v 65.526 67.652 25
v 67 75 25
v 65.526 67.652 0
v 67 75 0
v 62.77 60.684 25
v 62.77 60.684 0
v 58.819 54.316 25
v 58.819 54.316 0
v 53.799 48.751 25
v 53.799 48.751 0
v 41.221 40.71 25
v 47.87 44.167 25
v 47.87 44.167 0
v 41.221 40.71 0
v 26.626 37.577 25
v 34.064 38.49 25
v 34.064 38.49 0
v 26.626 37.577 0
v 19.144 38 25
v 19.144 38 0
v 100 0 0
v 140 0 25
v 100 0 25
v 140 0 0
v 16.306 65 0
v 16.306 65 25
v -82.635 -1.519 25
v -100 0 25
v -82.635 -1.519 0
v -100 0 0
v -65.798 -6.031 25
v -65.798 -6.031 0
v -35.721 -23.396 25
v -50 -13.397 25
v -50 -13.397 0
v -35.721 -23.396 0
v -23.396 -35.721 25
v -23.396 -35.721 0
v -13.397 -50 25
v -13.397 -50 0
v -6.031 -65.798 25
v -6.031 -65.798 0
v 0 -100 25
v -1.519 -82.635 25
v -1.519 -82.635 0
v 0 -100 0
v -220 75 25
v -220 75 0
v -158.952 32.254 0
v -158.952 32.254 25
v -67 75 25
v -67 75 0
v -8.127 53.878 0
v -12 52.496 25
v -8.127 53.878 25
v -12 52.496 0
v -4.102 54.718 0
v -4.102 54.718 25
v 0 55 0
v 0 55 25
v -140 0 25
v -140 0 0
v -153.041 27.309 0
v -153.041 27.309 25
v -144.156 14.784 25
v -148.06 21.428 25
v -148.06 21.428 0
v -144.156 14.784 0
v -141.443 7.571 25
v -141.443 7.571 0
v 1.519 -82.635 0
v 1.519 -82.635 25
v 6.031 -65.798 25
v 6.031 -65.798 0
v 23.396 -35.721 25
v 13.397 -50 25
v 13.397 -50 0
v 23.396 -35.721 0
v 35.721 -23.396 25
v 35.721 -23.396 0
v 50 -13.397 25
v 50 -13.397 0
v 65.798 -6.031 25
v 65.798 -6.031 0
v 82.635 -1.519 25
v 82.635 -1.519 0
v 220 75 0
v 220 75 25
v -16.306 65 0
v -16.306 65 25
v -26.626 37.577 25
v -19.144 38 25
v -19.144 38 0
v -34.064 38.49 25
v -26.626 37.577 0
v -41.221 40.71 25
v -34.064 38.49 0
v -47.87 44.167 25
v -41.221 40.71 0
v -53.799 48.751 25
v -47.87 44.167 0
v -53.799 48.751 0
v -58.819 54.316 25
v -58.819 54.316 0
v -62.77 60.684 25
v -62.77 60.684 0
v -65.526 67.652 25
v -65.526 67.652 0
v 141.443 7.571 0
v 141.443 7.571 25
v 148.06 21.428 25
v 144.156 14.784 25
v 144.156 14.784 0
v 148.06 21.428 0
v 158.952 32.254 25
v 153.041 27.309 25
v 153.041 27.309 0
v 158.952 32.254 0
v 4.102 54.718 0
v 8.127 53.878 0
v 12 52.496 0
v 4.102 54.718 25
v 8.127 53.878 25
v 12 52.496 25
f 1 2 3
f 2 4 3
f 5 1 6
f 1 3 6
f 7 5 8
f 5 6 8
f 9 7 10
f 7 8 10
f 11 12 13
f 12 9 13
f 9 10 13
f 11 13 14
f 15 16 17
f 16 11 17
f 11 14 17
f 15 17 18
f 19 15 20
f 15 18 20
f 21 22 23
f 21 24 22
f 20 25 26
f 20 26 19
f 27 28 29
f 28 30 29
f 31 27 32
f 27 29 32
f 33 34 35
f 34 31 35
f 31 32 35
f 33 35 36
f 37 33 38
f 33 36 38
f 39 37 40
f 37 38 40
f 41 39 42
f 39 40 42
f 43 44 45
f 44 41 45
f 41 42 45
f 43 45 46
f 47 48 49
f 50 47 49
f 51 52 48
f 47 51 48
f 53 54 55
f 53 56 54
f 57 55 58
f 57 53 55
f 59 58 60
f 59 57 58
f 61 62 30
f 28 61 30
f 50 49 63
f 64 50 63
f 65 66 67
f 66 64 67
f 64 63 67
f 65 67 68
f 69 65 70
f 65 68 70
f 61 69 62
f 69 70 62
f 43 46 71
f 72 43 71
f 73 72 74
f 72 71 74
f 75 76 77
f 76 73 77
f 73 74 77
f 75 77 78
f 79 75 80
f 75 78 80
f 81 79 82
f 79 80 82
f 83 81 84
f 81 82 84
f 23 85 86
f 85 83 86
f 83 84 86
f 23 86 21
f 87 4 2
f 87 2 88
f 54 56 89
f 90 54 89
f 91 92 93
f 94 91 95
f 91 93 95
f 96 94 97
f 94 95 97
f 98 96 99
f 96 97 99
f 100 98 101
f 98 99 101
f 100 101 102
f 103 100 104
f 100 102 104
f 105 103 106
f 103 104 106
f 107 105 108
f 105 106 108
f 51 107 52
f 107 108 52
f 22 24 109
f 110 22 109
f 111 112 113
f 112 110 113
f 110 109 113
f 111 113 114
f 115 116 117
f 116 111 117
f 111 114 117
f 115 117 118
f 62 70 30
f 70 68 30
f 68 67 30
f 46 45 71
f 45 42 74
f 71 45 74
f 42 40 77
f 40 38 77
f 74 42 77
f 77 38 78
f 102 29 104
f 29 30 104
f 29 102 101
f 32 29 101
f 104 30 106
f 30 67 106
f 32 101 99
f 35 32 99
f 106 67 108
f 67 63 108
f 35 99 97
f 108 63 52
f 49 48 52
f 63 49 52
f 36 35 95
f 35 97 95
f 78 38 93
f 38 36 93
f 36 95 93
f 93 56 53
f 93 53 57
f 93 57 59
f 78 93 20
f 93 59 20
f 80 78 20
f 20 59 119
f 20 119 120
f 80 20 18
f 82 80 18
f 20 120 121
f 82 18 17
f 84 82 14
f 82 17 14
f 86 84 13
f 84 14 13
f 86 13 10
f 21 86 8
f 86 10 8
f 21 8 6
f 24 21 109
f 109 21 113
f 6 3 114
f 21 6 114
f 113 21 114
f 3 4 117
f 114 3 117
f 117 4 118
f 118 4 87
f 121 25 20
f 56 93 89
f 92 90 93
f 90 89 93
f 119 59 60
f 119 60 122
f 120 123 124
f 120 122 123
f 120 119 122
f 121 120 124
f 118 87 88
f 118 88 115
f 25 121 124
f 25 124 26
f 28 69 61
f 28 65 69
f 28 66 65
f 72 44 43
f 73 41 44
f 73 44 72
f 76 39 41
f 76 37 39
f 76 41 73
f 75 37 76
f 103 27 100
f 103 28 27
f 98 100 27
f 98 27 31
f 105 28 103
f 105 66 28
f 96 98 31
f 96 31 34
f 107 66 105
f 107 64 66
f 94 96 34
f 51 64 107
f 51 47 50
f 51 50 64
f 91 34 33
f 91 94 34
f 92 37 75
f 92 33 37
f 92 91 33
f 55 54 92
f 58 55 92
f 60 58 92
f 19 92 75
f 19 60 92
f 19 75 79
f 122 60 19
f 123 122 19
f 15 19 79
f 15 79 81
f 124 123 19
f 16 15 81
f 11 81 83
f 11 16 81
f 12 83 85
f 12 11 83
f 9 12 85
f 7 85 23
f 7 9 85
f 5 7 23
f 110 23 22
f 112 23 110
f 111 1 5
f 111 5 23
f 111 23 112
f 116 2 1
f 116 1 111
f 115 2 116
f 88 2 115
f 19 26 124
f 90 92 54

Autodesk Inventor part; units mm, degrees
ref_plane "YZ Plane" through (0, 0, 0) normal (1, 0, 0) x (0, 1, 0)
ref_plane "XZ Plane" through (0, 0, 0) normal (0, 1, 0) x (-1, 0, 0)
ref_plane "XY Plane" through (0, 0, 0) normal (0, 0, 1) x (1, 0, 0)
sketch "Sketch1" plane through (0, 0, 0) normal (0, 0, 1) x (1, 0, 0)
  line L0 (0, 110.8966) -> (0, -110.8966) construction
  line L1 (-205.6207, 0) -> (205.6207, 0) construction
  line L2 (-67, 75) -> (-220, 75)
  line L3 (-220, 75) -> (-158.9525, 32.2541)
  line L4 (-140, 0) -> (-100, 0)
  arc A0 (-140, 0) -> (-158.9525, 32.2541) centre (-184.7635, -4.6077) ccw
  arc A1 (0, -100) -> (-100, 0) centre (-100, -100) ccw
  arc A2 (0, 55) -> (-12, 52.4955) centre (0, 25) ccw
  line L5 (-12, 52.4955) -> (-16.3057, 65)
  line L6 (-16.3057, 65) -> (-19.1435, 38)
  arc A3 (-67, 75) -> (-19.1435, 38) centre (-25.2476, 79.5541) ccw
  line L7 (205.6207, 0) -> (-205.6207, 0) construction
  line L8 (67, 75) -> (220, 75)
  line L9 (220, 75) -> (158.9525, 32.2541)
  line L10 (140, 0) -> (100, 0)
  arc A4 (158.9525, 32.2541) -> (140, 0) centre (184.7635, -4.6077) ccw
  arc A5 (100, 0) -> (0, -100) centre (100, -100) ccw
  arc A6 (12, 52.4955) -> (0, 55) centre (0, 25) ccw
  line L11 (12, 52.4955) -> (16.3057, 65)
  line L12 (16.3057, 65) -> (19.1435, 38)
  arc A7 (19.1435, 38) -> (67, 75) centre (25.2476, 79.5541) ccw
  point P0 (0, 0)
  point P1 (0, 0)
  dimension "d1" = 67
  dimension "d2" = 220
  dimension "d3" = 35
  dimension "d4" = 45
  dimension "d5" = 140
  dimension "d7" = 75
  dimension "d8" = 100
  dimension "d9" = 100
  dimension "d10" = 30
  dimension "d11" = 50
  dimension "d12" = 12
  dimension "d13" = 10
  dimension "d14" = 37
  dimension "d15" = 25
  dimension "d21" = 42
  dimension "d23" = 84
extrude "Extrusion1" add sketch "Sketch1" along normal blind 25
properties part number "Batarang"
